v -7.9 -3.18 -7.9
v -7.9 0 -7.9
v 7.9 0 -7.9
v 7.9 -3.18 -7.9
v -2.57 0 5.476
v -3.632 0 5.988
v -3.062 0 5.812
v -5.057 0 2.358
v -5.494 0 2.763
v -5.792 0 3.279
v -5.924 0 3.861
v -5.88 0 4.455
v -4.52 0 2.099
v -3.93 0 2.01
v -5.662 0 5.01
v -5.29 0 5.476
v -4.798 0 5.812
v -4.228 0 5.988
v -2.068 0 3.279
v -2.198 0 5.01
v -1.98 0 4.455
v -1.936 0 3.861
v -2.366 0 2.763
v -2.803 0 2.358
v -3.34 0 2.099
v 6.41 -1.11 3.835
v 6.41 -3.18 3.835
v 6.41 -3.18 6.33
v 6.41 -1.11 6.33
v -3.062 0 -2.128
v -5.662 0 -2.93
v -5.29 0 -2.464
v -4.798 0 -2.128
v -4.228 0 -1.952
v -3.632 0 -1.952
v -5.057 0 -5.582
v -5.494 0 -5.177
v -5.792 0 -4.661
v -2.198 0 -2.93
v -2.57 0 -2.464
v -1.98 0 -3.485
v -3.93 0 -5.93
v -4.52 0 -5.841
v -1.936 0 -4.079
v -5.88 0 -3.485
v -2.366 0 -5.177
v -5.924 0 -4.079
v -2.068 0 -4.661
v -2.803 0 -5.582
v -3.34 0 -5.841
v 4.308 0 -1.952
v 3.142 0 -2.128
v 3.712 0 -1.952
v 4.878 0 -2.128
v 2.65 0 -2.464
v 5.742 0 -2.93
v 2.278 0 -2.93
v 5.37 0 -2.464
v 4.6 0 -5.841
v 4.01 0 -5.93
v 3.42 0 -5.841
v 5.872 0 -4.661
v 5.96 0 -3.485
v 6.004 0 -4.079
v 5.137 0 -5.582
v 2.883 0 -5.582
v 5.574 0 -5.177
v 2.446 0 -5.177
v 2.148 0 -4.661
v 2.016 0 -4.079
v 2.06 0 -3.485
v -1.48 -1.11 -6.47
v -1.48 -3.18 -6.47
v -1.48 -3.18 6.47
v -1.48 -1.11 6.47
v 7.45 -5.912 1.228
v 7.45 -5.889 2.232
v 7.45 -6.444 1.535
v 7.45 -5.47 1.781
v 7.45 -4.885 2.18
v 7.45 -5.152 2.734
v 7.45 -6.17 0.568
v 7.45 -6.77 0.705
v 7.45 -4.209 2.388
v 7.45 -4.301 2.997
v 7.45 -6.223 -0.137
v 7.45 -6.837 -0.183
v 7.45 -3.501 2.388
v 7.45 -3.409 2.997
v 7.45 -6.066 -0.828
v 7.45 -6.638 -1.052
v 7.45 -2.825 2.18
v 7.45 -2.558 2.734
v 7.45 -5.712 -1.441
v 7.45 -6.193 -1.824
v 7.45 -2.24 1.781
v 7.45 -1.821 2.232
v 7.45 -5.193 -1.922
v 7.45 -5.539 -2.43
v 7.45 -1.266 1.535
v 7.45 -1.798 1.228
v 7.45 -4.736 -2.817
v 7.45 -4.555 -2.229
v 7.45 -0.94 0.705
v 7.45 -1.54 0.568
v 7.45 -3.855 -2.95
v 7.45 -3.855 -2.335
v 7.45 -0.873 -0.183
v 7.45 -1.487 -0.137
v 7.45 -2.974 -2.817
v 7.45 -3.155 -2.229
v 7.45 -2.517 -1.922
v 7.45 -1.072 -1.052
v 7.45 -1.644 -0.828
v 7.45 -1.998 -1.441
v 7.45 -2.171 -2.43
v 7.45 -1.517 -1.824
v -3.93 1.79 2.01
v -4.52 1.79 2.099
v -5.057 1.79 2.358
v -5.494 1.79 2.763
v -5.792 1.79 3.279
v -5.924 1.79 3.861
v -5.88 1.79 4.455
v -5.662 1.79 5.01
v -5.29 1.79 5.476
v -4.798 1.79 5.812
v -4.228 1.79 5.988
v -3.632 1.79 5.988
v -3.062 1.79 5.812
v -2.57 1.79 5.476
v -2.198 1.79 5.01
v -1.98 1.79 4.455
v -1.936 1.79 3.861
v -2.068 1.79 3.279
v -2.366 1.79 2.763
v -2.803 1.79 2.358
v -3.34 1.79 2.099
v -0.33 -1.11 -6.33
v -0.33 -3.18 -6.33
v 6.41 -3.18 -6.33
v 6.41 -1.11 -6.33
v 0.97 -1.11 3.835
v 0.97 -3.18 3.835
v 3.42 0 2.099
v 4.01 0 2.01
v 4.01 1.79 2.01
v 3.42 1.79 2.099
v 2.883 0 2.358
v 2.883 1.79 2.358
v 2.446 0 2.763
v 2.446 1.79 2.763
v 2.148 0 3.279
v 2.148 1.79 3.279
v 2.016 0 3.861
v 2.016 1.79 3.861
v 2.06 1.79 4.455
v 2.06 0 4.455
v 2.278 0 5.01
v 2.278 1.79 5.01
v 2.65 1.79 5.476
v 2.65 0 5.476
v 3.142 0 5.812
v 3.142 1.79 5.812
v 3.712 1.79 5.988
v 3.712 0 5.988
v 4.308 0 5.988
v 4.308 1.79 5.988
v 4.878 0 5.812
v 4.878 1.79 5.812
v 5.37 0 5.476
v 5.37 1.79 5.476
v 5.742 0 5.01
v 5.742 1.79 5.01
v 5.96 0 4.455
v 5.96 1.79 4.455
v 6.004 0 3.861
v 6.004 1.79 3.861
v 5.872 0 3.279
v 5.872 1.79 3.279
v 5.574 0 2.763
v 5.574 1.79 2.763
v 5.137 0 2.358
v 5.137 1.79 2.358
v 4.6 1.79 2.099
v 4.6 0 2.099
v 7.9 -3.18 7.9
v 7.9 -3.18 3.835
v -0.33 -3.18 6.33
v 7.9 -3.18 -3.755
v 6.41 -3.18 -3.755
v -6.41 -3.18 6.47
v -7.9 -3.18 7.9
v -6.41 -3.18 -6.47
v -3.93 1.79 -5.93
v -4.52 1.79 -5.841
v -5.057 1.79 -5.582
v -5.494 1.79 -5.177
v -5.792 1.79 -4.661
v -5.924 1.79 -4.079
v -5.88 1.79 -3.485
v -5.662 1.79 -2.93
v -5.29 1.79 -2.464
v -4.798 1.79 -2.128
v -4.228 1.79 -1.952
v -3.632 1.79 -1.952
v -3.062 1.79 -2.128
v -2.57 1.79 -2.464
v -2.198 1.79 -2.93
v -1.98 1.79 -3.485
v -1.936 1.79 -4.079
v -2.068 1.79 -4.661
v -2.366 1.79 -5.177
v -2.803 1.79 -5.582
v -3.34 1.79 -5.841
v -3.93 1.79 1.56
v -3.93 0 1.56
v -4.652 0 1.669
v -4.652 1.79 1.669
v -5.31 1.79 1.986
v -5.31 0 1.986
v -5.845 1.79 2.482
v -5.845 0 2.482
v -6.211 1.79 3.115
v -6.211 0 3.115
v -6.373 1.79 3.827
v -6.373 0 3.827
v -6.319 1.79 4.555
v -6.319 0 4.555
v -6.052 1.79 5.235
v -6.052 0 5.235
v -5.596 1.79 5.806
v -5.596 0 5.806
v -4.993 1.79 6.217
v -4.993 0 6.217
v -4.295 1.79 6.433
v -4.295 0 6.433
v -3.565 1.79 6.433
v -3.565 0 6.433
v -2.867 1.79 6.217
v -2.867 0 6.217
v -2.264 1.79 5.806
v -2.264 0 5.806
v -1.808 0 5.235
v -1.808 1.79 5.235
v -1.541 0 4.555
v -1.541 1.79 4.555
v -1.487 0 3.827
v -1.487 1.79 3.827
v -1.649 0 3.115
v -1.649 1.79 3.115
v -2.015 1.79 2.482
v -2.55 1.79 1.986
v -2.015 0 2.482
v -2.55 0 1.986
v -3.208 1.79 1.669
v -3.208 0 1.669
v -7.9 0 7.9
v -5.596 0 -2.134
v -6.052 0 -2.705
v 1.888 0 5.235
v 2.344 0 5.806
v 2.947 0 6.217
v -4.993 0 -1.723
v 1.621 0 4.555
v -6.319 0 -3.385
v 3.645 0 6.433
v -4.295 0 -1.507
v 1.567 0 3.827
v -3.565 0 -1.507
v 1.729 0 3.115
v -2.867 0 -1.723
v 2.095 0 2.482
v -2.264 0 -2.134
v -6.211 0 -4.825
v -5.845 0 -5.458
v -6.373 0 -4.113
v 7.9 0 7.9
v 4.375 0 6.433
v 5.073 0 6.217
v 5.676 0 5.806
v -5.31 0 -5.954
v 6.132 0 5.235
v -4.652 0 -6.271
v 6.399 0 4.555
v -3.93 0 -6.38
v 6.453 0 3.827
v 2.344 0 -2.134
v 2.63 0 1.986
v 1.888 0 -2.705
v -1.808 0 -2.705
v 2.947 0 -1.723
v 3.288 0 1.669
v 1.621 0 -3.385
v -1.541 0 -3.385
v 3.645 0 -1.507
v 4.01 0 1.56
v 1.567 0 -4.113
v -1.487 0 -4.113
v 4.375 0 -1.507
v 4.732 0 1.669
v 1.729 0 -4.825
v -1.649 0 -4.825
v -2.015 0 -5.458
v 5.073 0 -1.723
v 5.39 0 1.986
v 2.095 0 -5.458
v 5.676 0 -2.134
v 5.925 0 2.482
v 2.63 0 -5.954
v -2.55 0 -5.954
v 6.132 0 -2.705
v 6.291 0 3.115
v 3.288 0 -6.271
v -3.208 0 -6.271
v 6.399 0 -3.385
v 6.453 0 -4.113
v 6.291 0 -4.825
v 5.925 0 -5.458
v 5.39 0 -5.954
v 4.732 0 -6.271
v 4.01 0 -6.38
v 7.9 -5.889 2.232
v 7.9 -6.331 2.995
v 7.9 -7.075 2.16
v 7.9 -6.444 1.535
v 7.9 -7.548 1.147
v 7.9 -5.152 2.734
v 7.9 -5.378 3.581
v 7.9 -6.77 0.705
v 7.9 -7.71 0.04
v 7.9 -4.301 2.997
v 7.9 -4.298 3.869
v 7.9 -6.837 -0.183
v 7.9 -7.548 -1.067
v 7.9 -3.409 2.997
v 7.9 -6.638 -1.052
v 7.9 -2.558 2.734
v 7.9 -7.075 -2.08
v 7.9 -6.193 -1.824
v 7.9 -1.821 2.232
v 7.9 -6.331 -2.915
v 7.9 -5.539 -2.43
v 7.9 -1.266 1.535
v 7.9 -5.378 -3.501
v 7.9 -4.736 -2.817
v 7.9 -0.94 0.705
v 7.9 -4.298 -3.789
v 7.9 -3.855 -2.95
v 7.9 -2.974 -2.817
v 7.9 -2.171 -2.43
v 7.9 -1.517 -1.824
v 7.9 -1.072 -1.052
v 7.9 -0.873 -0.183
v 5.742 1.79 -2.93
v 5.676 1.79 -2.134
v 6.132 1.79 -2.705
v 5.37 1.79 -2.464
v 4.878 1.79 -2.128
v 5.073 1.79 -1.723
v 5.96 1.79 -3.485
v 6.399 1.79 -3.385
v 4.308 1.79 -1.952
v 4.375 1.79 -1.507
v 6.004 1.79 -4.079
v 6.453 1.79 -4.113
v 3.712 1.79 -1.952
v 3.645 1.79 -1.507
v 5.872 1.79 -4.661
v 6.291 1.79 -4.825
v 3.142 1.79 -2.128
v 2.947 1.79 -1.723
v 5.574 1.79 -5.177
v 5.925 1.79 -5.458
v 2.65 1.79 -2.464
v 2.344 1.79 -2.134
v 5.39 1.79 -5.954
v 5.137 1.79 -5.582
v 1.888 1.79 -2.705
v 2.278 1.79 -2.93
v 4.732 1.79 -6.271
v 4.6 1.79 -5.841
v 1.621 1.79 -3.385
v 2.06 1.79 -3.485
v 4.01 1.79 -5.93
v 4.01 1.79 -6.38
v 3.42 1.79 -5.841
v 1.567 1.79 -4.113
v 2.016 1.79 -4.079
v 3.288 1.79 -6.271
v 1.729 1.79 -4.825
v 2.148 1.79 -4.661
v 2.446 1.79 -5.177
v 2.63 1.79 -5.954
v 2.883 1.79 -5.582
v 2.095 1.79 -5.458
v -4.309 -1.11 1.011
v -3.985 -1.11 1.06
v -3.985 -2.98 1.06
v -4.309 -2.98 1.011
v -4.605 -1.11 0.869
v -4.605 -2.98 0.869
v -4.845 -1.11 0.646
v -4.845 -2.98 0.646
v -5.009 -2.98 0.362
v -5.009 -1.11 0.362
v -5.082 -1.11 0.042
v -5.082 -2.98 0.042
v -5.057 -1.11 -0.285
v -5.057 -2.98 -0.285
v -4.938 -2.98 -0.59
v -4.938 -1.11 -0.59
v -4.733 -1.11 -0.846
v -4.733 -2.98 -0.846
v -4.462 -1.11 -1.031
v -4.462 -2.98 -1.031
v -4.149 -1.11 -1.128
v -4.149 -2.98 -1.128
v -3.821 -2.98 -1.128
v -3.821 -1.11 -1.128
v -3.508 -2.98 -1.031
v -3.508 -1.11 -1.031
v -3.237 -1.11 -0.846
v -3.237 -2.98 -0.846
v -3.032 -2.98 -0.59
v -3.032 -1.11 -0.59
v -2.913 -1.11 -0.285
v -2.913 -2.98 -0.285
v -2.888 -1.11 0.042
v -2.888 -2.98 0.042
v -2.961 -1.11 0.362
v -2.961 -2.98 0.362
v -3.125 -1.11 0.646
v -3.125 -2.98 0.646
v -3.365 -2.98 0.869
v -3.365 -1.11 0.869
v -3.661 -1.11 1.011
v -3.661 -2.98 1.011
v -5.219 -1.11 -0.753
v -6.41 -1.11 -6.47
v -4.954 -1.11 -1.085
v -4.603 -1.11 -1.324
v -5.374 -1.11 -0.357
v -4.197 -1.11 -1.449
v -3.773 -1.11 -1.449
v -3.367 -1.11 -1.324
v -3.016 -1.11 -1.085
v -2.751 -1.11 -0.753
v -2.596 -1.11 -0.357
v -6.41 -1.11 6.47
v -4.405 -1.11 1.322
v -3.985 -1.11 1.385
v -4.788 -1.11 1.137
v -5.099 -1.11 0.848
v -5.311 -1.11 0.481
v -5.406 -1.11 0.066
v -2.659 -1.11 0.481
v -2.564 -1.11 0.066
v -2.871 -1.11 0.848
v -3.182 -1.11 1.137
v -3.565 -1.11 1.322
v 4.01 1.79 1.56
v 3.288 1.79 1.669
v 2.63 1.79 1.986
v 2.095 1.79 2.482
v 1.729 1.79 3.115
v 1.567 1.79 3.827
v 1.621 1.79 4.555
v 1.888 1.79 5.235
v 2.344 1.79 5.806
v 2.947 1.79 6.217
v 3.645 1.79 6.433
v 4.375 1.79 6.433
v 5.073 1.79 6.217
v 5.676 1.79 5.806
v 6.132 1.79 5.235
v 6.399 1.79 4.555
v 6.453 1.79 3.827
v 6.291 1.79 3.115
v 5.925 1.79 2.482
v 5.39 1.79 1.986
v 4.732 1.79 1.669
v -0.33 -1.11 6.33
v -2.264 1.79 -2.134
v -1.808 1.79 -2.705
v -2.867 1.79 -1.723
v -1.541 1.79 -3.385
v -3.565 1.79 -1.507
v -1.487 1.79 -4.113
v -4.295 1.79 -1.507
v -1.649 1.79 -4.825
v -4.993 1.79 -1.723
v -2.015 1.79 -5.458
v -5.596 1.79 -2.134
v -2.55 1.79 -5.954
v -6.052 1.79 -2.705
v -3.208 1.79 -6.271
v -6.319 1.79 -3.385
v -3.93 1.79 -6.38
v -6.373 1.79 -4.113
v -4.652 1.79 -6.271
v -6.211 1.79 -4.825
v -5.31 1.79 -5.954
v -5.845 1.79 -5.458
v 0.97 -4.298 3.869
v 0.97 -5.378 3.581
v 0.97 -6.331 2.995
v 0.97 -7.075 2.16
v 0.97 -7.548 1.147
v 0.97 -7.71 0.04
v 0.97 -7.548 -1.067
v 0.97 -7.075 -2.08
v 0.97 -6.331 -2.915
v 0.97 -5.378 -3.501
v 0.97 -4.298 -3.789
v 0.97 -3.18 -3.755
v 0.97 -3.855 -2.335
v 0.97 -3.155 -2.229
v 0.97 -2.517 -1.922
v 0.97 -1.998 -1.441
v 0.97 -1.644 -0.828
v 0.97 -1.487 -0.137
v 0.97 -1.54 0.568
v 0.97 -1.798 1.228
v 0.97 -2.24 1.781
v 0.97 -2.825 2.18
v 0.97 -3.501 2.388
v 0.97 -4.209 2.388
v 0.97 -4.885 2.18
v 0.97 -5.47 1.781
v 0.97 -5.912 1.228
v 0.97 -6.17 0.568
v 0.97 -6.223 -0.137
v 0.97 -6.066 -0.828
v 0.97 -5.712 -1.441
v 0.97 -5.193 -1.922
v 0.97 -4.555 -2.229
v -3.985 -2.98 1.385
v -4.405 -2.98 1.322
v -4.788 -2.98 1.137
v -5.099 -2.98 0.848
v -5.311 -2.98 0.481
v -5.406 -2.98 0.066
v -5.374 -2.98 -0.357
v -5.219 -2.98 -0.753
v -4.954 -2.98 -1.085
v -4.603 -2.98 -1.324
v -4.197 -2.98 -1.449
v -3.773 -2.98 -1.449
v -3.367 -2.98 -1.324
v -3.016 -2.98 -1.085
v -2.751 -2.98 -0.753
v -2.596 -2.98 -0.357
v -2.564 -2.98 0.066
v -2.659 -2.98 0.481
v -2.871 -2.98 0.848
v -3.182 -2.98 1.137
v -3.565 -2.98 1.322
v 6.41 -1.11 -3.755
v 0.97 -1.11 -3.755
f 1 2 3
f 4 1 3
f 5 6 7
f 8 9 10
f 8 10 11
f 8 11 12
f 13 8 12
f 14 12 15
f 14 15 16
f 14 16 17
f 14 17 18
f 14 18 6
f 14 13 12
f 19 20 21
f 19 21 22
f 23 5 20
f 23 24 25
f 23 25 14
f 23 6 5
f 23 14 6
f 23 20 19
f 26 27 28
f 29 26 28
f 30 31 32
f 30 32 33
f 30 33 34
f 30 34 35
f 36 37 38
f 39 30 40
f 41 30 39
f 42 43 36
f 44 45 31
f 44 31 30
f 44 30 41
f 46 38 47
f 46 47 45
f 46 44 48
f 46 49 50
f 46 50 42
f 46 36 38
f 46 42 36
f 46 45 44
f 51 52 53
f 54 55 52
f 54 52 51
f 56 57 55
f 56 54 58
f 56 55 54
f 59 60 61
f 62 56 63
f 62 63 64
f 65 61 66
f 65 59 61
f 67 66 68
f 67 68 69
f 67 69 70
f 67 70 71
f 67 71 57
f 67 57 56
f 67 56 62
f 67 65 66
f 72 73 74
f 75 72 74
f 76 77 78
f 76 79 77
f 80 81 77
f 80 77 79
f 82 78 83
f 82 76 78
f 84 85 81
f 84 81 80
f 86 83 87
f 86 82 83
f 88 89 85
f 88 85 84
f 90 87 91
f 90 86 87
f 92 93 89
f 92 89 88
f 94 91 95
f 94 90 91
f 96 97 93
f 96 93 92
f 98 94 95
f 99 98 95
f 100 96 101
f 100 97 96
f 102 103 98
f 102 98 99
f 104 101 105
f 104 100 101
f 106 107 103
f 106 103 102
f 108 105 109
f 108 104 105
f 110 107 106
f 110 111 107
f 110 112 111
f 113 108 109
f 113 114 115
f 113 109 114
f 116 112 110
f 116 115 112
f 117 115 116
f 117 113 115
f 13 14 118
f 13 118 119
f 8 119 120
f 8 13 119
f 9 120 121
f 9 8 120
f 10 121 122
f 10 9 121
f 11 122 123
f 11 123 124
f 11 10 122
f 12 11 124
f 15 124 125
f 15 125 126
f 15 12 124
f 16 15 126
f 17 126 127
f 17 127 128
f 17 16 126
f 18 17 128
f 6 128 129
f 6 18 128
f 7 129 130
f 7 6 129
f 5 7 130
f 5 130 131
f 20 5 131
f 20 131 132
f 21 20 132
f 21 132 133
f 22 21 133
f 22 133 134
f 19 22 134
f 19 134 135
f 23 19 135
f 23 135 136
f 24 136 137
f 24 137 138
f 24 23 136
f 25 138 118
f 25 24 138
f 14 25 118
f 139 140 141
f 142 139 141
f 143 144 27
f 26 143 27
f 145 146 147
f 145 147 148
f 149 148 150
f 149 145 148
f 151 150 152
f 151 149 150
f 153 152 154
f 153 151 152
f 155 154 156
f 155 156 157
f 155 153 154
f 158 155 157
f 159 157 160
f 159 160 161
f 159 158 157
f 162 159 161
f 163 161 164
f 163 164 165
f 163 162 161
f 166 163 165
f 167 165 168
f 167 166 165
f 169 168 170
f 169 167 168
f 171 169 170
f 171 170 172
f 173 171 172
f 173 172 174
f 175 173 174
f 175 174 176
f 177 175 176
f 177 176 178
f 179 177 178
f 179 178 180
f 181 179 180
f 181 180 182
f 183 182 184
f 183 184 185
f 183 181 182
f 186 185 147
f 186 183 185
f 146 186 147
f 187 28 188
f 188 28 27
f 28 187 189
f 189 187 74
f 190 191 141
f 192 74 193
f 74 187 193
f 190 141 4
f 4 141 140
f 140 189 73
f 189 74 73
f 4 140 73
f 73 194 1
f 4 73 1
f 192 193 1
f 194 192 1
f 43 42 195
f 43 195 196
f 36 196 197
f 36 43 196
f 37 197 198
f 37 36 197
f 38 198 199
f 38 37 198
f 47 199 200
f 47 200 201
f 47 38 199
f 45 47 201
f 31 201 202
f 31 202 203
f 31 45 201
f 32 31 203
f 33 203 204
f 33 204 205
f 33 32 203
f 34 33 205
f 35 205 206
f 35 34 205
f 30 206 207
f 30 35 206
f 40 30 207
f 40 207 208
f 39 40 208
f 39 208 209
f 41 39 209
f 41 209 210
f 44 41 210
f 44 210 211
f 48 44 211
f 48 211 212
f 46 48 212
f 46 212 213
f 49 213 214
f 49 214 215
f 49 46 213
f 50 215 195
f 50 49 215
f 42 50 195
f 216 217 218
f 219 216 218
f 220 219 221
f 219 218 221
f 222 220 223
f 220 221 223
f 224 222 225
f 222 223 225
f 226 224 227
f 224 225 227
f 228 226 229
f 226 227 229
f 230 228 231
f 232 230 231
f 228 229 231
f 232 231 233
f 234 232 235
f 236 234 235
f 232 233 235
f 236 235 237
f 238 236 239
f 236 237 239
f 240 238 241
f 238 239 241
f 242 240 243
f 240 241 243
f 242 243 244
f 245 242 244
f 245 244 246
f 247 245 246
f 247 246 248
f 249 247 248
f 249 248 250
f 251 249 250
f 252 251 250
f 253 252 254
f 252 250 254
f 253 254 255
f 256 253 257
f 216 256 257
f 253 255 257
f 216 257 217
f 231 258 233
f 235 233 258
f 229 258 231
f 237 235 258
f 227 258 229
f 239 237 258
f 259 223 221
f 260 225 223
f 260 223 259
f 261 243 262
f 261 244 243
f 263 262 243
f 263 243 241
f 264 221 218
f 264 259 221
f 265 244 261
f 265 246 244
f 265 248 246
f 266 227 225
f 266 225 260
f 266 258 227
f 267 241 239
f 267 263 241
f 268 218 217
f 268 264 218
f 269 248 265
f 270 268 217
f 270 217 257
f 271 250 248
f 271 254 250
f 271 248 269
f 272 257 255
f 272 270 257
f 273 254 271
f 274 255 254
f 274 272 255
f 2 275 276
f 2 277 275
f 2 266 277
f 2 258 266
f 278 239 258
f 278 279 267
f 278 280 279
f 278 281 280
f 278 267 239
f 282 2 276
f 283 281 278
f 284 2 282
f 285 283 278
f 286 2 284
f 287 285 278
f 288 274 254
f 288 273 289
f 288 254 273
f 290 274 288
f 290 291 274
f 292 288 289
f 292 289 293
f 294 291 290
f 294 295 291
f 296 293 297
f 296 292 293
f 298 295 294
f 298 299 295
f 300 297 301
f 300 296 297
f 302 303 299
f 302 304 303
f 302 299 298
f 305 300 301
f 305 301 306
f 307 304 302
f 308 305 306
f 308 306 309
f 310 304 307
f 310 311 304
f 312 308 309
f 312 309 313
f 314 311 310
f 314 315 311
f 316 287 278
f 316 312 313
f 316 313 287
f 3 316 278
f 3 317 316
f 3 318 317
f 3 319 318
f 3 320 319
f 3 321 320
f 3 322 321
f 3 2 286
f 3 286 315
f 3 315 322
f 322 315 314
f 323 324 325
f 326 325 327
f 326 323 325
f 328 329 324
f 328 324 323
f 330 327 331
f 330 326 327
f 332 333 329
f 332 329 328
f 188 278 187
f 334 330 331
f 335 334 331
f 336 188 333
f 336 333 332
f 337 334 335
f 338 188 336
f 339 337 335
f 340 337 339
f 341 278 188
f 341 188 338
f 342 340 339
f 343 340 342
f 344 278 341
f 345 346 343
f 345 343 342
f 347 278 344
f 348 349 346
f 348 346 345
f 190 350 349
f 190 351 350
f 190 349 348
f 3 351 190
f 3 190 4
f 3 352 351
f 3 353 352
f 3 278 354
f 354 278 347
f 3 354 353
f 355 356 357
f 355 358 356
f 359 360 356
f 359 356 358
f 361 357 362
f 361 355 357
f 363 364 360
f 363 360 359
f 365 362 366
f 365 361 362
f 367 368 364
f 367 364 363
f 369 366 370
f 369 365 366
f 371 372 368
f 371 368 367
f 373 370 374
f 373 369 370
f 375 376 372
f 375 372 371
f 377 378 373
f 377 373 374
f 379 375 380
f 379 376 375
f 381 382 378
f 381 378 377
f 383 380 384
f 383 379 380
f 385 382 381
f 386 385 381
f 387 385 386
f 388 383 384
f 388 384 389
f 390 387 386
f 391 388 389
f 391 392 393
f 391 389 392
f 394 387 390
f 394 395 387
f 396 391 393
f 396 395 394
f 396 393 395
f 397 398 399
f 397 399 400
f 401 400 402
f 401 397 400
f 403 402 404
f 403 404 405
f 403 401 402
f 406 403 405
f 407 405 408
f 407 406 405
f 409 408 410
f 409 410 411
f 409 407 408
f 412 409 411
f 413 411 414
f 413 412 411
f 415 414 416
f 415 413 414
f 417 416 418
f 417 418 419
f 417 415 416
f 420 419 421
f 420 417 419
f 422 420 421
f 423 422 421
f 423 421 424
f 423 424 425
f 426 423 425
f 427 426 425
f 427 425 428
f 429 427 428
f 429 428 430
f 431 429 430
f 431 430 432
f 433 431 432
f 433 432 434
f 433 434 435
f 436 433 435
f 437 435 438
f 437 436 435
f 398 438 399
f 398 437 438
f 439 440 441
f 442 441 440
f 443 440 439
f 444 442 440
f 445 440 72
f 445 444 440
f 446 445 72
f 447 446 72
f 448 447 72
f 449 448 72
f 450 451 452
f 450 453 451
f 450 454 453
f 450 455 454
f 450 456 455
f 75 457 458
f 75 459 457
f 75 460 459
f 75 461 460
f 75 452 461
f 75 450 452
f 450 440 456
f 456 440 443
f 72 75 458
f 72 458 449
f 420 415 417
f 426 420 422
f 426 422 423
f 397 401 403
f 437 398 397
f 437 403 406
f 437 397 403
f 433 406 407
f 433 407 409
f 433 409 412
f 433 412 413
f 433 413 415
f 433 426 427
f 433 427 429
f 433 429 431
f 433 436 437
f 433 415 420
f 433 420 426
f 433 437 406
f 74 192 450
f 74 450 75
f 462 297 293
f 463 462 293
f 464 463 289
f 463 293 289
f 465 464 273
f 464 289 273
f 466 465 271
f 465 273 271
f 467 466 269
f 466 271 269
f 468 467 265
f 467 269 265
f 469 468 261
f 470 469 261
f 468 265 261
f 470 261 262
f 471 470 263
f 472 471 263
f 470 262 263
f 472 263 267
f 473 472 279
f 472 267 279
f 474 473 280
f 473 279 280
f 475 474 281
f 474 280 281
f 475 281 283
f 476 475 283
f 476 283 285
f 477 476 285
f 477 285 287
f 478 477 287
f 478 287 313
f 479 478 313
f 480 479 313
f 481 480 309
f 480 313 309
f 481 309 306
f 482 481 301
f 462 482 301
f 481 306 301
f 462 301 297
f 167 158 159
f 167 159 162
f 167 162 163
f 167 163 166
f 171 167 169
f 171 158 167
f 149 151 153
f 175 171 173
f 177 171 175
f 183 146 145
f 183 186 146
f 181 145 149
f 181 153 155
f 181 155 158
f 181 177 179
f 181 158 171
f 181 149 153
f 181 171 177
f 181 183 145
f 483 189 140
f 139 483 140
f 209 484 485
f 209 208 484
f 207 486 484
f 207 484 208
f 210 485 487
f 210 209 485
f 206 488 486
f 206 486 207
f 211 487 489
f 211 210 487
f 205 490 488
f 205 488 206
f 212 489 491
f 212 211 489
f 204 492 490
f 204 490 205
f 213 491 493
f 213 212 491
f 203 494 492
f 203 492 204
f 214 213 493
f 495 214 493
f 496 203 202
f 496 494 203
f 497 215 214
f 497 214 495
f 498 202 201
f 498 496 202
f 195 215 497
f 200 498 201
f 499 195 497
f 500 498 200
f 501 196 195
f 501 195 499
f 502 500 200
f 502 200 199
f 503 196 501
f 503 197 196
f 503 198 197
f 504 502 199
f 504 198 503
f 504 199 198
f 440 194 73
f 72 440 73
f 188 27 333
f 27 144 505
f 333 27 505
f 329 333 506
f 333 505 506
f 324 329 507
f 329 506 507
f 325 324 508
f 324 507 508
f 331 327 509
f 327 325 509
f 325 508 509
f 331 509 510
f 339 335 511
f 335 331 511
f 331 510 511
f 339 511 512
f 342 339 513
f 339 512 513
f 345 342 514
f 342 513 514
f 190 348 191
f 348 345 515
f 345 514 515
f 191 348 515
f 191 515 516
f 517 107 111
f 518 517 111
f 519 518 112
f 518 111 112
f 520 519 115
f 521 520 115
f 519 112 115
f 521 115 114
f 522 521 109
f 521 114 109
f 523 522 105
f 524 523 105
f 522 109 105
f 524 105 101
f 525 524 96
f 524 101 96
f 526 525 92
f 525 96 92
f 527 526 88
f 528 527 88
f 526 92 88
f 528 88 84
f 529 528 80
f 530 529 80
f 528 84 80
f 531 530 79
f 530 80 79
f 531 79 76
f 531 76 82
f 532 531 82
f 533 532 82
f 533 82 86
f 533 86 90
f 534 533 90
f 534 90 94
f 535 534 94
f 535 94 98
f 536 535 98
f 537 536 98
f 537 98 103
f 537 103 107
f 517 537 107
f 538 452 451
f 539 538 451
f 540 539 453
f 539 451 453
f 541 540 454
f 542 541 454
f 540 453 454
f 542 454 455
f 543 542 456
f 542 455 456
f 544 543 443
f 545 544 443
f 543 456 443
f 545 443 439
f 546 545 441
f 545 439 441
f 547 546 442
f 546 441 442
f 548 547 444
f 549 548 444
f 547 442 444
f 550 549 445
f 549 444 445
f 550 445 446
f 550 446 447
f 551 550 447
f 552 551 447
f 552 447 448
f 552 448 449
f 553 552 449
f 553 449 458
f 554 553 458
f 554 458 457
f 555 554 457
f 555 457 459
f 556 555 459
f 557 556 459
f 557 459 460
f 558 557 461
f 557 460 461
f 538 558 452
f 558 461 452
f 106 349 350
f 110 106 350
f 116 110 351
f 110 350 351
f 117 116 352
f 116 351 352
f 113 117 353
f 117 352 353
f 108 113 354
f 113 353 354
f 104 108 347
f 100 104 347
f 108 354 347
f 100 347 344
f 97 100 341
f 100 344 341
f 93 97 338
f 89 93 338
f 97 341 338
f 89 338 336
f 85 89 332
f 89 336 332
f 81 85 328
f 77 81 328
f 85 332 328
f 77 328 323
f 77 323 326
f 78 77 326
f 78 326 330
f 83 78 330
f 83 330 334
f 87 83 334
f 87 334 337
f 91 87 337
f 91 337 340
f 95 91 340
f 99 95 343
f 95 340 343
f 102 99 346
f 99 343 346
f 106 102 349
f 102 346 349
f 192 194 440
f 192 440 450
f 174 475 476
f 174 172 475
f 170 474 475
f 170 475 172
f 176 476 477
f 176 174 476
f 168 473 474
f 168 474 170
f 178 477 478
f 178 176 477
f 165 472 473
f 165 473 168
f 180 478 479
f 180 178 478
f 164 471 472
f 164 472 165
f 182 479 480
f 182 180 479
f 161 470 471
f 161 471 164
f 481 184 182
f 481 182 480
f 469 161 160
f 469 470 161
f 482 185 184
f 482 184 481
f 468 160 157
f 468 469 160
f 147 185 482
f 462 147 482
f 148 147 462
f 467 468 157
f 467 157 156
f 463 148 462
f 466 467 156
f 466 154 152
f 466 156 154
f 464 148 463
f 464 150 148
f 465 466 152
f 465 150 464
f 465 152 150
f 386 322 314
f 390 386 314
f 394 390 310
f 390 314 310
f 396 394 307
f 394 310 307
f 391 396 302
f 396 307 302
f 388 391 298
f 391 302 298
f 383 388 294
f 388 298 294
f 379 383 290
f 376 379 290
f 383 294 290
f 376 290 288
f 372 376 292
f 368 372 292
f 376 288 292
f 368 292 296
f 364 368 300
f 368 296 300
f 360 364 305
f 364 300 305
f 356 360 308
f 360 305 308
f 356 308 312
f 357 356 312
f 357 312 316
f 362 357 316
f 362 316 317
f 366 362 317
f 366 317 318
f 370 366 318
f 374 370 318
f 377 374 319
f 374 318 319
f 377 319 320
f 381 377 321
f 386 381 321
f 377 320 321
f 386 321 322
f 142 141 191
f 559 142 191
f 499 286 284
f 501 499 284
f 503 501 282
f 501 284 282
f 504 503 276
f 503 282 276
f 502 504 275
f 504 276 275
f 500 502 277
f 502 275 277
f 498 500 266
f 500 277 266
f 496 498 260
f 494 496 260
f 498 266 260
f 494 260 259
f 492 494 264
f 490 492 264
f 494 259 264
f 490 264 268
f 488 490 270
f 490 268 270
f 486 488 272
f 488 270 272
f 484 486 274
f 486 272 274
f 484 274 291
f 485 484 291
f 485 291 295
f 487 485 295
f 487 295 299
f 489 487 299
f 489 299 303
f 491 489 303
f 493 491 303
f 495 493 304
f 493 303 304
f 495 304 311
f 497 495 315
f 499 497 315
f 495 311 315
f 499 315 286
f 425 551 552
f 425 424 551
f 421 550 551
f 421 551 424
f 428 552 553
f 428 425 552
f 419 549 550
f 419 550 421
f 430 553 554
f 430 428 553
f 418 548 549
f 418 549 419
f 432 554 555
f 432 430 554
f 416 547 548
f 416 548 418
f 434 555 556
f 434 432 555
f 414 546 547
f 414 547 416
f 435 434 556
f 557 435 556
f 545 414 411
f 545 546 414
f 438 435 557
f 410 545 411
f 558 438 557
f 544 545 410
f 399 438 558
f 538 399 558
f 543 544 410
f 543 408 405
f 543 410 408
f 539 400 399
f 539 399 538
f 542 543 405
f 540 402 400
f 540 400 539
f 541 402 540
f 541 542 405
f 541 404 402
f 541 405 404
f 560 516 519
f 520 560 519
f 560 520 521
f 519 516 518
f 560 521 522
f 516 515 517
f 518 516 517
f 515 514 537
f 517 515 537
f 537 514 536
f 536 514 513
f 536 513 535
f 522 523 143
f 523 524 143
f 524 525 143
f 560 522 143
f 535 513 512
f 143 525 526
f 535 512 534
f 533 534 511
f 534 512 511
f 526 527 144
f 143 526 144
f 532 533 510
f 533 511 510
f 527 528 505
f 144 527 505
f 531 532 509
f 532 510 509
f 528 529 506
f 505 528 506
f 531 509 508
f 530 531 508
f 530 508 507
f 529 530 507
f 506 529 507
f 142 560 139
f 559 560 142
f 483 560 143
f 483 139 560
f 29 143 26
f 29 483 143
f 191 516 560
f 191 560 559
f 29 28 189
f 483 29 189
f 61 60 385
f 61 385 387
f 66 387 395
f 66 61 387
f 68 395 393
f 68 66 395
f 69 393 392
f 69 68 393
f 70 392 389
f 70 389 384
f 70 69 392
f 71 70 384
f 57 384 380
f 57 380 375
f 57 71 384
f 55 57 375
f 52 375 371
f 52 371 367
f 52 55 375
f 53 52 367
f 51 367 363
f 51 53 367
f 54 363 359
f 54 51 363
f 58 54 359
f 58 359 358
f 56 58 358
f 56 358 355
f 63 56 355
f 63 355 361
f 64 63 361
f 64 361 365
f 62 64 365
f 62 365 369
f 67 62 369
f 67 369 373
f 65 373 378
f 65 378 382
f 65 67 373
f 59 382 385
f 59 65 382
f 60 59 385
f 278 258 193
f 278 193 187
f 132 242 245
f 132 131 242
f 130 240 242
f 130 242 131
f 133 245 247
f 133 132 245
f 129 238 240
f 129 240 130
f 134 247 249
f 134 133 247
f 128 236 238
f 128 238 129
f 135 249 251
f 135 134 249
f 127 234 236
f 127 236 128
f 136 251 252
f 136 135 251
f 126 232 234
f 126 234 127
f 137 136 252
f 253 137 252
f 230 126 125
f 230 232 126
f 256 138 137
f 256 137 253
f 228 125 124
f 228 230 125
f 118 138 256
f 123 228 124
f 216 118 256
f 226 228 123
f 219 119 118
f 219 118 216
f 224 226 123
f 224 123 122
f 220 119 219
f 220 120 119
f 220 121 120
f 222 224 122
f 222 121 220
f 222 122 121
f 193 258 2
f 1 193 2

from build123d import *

# Parameters (mm, degrees)
SKETCH1_W               = 15.8
SKETCH1_H               = 15.8
BOSS_EXTRUDE1_DEPTH     = 7.71
SKETCH2_R               = 2.99
CUT_EXTRUDE1_DEPTH      = 0.45
SKETCH3_R               = 2.375
CUT_EXTRUDE2_DEPTH      = 6.56
CUT_EXTRUDE4_DEPTH      = 20.274182214
CUT_EXTRUDE4_DEPTH_BACK = 20.274182214
CUT_EXTRUDE5_DEPTH      = 20.274182214
CUT_EXTRUDE5_DEPTH_BACK = 8.87
CUT_EXTRUDE6_DEPTH      = 2.07
SKETCH10_W              = 5.44
SKETCH10_H              = 0.215050188
CUT_EXTRUDE8_DEPTH      = 2.07
SKETCH11_W              = 5.44
SKETCH11_H              = 0.461737218
CUT_EXTRUDE9_DEPTH      = 2.07
SKETCH12_W              = 4.93
SKETCH12_H              = 12.94
CUT_EXTRUDE10_DEPTH     = 2.07
SKETCH13_R              = 1.425
SKETCH13_R_2            = 1.1
BOSS_EXTRUDE2_DEPTH     = 1.87
SKETCH14_R              = 2.45
SKETCH14_R_2            = 2
BOSS_EXTRUDE3_DEPTH     = 1.79


with BuildPart() as part:
    # Sketch1 → Boss-Extrude1 (new body)
    with BuildSketch(Plane(origin=(0, 0, 0), x_dir=(1, 0, 0), z_dir=(0, 1, 0))):
        Rectangle(SKETCH1_W, SKETCH1_H)
    extrude(amount=-BOSS_EXTRUDE1_DEPTH)

    # Sketch2 → Cut-Extrude1 (cut)
    with BuildSketch(Plane(origin=(7.9, 0, 0), x_dir=(0, 0, -1), z_dir=(1, 0, 0))):
        with Locations((-0.04, -3.855)):
            Circle(SKETCH2_R)
    extrude(amount=-CUT_EXTRUDE1_DEPTH, mode=Mode.SUBTRACT)

    # Sketch3 → Cut-Extrude2 (cut)
    with BuildSketch(Plane(origin=(7.45, 0, 0), x_dir=(0, 0, -1), z_dir=(1, 0, 0))):
        with Locations((-0.04, -3.855)):
            Circle(SKETCH3_R)
    extrude(amount=-CUT_EXTRUDE2_DEPTH, mode=Mode.SUBTRACT)

    # Sketch4 → Cut-Extrude4 (cut, two sides: drawn at the far end of the back side and taken through both)
    with BuildSketch(Plane(origin=(7.9, 0, 0), x_dir=(0, 0, -1), z_dir=(1, 0, 0)).offset(-CUT_EXTRUDE4_DEPTH_BACK)):
        with BuildLine():
            Line((-50.773144054, -3.18), (-7.9, -3.18))
            Line((-7.9, -3.18), (-3.835444638, -3.18))
            ThreePointArc((-3.835444638, -3.18), (-0.04, -7.71), (3.755444638, -3.18))
            Line((3.755444638, -3.18), (7.9, -3.18))
            Line((7.9, -3.18), (50.773144054, -3.18))
            Line((50.773144054, -3.18), (50.773144054, -88.926288108))
            Line((50.773144054, -88.926288108), (-50.773144054, -88.926288108))
            Line((-50.773144054, -88.926288108), (-50.773144054, -3.18))
        make_face()
    extrude(amount=CUT_EXTRUDE4_DEPTH + CUT_EXTRUDE4_DEPTH_BACK, mode=Mode.SUBTRACT)

    # Sketch6 → Cut-Extrude5 (cut, two sides: drawn at the far end of the back side and taken through both)
    with BuildSketch(Plane.ZY.offset(7.9).offset(-CUT_EXTRUDE5_DEPTH_BACK)):
        Polygon((-38.914265028, -3.18), (-3.755444638, -3.18), (3.835444638, -3.18), (38.994265028, -3.18), (38.994265028, -73.49764078), (-38.914265028, -73.49764078), align=None)
    extrude(amount=CUT_EXTRUDE5_DEPTH + CUT_EXTRUDE5_DEPTH_BACK, mode=Mode.SUBTRACT)

    # Sketch7 → Cut-Extrude6 (cut)
    with BuildSketch(Plane.XZ.offset(3.18)):
        Polygon((6.41, 6.33), (-0.33, 6.33), (-0.33, -6.33), (6.41, -6.33), (6.41, -4.217181856), (0.97, -4.217181856), (0.97, 4.050494826), (6.41, 4.050494826), align=None)
    extrude(amount=-CUT_EXTRUDE6_DEPTH, mode=Mode.SUBTRACT)

    # Sketch10 → Cut-Extrude8 (cut)
    with BuildSketch(Plane.XZ.offset(3.18)):
        with Locations((3.69, 3.942969732)):
            Rectangle(SKETCH10_W, SKETCH10_H)
    extrude(amount=-CUT_EXTRUDE8_DEPTH, mode=Mode.SUBTRACT)

    # Sketch11 → Cut-Extrude9 (cut)
    with BuildSketch(Plane.XZ.offset(3.18)):
        with Locations((3.69, -3.986313247)):
            Rectangle(SKETCH11_W, SKETCH11_H)
    extrude(amount=-CUT_EXTRUDE9_DEPTH, mode=Mode.SUBTRACT)

    # Sketch12 → Cut-Extrude10 (cut)
    with BuildSketch(Plane.XZ.offset(3.18)):
        with Locations((-3.945, 0)):
            Rectangle(SKETCH12_W, SKETCH12_H)
    extrude(amount=-CUT_EXTRUDE10_DEPTH, mode=Mode.SUBTRACT)

    # Sketch13 → Boss-Extrude2 (add)
    with BuildSketch(Plane.XZ.offset(1.11)):
        with Locations(Location((-3.985, -0.04, 0), (0, 0, 90))):
            Circle(SKETCH13_R)
        with Locations(Location((-3.985, -0.04, 0), (0, 0, 90))):
            Circle(SKETCH13_R_2, mode=Mode.SUBTRACT)
    extrude(amount=BOSS_EXTRUDE2_DEPTH)

    # Sketch14 → Boss-Extrude3 (add)
    # profile 1 of 4: a face of its own
    with BuildSketch(Plane(origin=(0, 0, 0), x_dir=(1, 0, 0), z_dir=(0, 1, 0))):
        with Locations(Location((-3.93, 3.93, 0), (0, 0, 90))):
            Circle(SKETCH14_R)
        with Locations(Location((-3.93, 3.93, 0), (0, 0, 90))):
            Circle(SKETCH14_R_2, mode=Mode.SUBTRACT)
    # profile 2 of 4: a face of its own
    with BuildSketch(Plane(origin=(0, 0, 0), x_dir=(1, 0, 0), z_dir=(0, 1, 0))):
        with Locations(Location((4.01, 3.93, 0), (0, 0, 90))):
            Circle(SKETCH14_R)
        with Locations(Location((4.01, 3.93, 0), (0, 0, 90))):
            Circle(SKETCH14_R_2, mode=Mode.SUBTRACT)
    # profile 3 of 4: a face of its own
    with BuildSketch(Plane(origin=(0, 0, 0), x_dir=(1, 0, 0), z_dir=(0, 1, 0))):
        with Locations(Location((-3.93, -4.01, 0), (0, 0, 90))):
            Circle(SKETCH14_R)
        with Locations(Location((-3.93, -4.01, 0), (0, 0, 90))):
            Circle(SKETCH14_R_2, mode=Mode.SUBTRACT)
    # profile 4 of 4: a face of its own
    with BuildSketch(Plane(origin=(0, 0, 0), x_dir=(1, 0, 0), z_dir=(0, 1, 0))):
        with Locations(Location((4.01, -4.01, 0), (0, 0, 90))):
            Circle(SKETCH14_R)
        with Locations(Location((4.01, -4.01, 0), (0, 0, 90))):
            Circle(SKETCH14_R_2, mode=Mode.SUBTRACT)
    extrude(amount=BOSS_EXTRUDE3_DEPTH)


solid = part.part
